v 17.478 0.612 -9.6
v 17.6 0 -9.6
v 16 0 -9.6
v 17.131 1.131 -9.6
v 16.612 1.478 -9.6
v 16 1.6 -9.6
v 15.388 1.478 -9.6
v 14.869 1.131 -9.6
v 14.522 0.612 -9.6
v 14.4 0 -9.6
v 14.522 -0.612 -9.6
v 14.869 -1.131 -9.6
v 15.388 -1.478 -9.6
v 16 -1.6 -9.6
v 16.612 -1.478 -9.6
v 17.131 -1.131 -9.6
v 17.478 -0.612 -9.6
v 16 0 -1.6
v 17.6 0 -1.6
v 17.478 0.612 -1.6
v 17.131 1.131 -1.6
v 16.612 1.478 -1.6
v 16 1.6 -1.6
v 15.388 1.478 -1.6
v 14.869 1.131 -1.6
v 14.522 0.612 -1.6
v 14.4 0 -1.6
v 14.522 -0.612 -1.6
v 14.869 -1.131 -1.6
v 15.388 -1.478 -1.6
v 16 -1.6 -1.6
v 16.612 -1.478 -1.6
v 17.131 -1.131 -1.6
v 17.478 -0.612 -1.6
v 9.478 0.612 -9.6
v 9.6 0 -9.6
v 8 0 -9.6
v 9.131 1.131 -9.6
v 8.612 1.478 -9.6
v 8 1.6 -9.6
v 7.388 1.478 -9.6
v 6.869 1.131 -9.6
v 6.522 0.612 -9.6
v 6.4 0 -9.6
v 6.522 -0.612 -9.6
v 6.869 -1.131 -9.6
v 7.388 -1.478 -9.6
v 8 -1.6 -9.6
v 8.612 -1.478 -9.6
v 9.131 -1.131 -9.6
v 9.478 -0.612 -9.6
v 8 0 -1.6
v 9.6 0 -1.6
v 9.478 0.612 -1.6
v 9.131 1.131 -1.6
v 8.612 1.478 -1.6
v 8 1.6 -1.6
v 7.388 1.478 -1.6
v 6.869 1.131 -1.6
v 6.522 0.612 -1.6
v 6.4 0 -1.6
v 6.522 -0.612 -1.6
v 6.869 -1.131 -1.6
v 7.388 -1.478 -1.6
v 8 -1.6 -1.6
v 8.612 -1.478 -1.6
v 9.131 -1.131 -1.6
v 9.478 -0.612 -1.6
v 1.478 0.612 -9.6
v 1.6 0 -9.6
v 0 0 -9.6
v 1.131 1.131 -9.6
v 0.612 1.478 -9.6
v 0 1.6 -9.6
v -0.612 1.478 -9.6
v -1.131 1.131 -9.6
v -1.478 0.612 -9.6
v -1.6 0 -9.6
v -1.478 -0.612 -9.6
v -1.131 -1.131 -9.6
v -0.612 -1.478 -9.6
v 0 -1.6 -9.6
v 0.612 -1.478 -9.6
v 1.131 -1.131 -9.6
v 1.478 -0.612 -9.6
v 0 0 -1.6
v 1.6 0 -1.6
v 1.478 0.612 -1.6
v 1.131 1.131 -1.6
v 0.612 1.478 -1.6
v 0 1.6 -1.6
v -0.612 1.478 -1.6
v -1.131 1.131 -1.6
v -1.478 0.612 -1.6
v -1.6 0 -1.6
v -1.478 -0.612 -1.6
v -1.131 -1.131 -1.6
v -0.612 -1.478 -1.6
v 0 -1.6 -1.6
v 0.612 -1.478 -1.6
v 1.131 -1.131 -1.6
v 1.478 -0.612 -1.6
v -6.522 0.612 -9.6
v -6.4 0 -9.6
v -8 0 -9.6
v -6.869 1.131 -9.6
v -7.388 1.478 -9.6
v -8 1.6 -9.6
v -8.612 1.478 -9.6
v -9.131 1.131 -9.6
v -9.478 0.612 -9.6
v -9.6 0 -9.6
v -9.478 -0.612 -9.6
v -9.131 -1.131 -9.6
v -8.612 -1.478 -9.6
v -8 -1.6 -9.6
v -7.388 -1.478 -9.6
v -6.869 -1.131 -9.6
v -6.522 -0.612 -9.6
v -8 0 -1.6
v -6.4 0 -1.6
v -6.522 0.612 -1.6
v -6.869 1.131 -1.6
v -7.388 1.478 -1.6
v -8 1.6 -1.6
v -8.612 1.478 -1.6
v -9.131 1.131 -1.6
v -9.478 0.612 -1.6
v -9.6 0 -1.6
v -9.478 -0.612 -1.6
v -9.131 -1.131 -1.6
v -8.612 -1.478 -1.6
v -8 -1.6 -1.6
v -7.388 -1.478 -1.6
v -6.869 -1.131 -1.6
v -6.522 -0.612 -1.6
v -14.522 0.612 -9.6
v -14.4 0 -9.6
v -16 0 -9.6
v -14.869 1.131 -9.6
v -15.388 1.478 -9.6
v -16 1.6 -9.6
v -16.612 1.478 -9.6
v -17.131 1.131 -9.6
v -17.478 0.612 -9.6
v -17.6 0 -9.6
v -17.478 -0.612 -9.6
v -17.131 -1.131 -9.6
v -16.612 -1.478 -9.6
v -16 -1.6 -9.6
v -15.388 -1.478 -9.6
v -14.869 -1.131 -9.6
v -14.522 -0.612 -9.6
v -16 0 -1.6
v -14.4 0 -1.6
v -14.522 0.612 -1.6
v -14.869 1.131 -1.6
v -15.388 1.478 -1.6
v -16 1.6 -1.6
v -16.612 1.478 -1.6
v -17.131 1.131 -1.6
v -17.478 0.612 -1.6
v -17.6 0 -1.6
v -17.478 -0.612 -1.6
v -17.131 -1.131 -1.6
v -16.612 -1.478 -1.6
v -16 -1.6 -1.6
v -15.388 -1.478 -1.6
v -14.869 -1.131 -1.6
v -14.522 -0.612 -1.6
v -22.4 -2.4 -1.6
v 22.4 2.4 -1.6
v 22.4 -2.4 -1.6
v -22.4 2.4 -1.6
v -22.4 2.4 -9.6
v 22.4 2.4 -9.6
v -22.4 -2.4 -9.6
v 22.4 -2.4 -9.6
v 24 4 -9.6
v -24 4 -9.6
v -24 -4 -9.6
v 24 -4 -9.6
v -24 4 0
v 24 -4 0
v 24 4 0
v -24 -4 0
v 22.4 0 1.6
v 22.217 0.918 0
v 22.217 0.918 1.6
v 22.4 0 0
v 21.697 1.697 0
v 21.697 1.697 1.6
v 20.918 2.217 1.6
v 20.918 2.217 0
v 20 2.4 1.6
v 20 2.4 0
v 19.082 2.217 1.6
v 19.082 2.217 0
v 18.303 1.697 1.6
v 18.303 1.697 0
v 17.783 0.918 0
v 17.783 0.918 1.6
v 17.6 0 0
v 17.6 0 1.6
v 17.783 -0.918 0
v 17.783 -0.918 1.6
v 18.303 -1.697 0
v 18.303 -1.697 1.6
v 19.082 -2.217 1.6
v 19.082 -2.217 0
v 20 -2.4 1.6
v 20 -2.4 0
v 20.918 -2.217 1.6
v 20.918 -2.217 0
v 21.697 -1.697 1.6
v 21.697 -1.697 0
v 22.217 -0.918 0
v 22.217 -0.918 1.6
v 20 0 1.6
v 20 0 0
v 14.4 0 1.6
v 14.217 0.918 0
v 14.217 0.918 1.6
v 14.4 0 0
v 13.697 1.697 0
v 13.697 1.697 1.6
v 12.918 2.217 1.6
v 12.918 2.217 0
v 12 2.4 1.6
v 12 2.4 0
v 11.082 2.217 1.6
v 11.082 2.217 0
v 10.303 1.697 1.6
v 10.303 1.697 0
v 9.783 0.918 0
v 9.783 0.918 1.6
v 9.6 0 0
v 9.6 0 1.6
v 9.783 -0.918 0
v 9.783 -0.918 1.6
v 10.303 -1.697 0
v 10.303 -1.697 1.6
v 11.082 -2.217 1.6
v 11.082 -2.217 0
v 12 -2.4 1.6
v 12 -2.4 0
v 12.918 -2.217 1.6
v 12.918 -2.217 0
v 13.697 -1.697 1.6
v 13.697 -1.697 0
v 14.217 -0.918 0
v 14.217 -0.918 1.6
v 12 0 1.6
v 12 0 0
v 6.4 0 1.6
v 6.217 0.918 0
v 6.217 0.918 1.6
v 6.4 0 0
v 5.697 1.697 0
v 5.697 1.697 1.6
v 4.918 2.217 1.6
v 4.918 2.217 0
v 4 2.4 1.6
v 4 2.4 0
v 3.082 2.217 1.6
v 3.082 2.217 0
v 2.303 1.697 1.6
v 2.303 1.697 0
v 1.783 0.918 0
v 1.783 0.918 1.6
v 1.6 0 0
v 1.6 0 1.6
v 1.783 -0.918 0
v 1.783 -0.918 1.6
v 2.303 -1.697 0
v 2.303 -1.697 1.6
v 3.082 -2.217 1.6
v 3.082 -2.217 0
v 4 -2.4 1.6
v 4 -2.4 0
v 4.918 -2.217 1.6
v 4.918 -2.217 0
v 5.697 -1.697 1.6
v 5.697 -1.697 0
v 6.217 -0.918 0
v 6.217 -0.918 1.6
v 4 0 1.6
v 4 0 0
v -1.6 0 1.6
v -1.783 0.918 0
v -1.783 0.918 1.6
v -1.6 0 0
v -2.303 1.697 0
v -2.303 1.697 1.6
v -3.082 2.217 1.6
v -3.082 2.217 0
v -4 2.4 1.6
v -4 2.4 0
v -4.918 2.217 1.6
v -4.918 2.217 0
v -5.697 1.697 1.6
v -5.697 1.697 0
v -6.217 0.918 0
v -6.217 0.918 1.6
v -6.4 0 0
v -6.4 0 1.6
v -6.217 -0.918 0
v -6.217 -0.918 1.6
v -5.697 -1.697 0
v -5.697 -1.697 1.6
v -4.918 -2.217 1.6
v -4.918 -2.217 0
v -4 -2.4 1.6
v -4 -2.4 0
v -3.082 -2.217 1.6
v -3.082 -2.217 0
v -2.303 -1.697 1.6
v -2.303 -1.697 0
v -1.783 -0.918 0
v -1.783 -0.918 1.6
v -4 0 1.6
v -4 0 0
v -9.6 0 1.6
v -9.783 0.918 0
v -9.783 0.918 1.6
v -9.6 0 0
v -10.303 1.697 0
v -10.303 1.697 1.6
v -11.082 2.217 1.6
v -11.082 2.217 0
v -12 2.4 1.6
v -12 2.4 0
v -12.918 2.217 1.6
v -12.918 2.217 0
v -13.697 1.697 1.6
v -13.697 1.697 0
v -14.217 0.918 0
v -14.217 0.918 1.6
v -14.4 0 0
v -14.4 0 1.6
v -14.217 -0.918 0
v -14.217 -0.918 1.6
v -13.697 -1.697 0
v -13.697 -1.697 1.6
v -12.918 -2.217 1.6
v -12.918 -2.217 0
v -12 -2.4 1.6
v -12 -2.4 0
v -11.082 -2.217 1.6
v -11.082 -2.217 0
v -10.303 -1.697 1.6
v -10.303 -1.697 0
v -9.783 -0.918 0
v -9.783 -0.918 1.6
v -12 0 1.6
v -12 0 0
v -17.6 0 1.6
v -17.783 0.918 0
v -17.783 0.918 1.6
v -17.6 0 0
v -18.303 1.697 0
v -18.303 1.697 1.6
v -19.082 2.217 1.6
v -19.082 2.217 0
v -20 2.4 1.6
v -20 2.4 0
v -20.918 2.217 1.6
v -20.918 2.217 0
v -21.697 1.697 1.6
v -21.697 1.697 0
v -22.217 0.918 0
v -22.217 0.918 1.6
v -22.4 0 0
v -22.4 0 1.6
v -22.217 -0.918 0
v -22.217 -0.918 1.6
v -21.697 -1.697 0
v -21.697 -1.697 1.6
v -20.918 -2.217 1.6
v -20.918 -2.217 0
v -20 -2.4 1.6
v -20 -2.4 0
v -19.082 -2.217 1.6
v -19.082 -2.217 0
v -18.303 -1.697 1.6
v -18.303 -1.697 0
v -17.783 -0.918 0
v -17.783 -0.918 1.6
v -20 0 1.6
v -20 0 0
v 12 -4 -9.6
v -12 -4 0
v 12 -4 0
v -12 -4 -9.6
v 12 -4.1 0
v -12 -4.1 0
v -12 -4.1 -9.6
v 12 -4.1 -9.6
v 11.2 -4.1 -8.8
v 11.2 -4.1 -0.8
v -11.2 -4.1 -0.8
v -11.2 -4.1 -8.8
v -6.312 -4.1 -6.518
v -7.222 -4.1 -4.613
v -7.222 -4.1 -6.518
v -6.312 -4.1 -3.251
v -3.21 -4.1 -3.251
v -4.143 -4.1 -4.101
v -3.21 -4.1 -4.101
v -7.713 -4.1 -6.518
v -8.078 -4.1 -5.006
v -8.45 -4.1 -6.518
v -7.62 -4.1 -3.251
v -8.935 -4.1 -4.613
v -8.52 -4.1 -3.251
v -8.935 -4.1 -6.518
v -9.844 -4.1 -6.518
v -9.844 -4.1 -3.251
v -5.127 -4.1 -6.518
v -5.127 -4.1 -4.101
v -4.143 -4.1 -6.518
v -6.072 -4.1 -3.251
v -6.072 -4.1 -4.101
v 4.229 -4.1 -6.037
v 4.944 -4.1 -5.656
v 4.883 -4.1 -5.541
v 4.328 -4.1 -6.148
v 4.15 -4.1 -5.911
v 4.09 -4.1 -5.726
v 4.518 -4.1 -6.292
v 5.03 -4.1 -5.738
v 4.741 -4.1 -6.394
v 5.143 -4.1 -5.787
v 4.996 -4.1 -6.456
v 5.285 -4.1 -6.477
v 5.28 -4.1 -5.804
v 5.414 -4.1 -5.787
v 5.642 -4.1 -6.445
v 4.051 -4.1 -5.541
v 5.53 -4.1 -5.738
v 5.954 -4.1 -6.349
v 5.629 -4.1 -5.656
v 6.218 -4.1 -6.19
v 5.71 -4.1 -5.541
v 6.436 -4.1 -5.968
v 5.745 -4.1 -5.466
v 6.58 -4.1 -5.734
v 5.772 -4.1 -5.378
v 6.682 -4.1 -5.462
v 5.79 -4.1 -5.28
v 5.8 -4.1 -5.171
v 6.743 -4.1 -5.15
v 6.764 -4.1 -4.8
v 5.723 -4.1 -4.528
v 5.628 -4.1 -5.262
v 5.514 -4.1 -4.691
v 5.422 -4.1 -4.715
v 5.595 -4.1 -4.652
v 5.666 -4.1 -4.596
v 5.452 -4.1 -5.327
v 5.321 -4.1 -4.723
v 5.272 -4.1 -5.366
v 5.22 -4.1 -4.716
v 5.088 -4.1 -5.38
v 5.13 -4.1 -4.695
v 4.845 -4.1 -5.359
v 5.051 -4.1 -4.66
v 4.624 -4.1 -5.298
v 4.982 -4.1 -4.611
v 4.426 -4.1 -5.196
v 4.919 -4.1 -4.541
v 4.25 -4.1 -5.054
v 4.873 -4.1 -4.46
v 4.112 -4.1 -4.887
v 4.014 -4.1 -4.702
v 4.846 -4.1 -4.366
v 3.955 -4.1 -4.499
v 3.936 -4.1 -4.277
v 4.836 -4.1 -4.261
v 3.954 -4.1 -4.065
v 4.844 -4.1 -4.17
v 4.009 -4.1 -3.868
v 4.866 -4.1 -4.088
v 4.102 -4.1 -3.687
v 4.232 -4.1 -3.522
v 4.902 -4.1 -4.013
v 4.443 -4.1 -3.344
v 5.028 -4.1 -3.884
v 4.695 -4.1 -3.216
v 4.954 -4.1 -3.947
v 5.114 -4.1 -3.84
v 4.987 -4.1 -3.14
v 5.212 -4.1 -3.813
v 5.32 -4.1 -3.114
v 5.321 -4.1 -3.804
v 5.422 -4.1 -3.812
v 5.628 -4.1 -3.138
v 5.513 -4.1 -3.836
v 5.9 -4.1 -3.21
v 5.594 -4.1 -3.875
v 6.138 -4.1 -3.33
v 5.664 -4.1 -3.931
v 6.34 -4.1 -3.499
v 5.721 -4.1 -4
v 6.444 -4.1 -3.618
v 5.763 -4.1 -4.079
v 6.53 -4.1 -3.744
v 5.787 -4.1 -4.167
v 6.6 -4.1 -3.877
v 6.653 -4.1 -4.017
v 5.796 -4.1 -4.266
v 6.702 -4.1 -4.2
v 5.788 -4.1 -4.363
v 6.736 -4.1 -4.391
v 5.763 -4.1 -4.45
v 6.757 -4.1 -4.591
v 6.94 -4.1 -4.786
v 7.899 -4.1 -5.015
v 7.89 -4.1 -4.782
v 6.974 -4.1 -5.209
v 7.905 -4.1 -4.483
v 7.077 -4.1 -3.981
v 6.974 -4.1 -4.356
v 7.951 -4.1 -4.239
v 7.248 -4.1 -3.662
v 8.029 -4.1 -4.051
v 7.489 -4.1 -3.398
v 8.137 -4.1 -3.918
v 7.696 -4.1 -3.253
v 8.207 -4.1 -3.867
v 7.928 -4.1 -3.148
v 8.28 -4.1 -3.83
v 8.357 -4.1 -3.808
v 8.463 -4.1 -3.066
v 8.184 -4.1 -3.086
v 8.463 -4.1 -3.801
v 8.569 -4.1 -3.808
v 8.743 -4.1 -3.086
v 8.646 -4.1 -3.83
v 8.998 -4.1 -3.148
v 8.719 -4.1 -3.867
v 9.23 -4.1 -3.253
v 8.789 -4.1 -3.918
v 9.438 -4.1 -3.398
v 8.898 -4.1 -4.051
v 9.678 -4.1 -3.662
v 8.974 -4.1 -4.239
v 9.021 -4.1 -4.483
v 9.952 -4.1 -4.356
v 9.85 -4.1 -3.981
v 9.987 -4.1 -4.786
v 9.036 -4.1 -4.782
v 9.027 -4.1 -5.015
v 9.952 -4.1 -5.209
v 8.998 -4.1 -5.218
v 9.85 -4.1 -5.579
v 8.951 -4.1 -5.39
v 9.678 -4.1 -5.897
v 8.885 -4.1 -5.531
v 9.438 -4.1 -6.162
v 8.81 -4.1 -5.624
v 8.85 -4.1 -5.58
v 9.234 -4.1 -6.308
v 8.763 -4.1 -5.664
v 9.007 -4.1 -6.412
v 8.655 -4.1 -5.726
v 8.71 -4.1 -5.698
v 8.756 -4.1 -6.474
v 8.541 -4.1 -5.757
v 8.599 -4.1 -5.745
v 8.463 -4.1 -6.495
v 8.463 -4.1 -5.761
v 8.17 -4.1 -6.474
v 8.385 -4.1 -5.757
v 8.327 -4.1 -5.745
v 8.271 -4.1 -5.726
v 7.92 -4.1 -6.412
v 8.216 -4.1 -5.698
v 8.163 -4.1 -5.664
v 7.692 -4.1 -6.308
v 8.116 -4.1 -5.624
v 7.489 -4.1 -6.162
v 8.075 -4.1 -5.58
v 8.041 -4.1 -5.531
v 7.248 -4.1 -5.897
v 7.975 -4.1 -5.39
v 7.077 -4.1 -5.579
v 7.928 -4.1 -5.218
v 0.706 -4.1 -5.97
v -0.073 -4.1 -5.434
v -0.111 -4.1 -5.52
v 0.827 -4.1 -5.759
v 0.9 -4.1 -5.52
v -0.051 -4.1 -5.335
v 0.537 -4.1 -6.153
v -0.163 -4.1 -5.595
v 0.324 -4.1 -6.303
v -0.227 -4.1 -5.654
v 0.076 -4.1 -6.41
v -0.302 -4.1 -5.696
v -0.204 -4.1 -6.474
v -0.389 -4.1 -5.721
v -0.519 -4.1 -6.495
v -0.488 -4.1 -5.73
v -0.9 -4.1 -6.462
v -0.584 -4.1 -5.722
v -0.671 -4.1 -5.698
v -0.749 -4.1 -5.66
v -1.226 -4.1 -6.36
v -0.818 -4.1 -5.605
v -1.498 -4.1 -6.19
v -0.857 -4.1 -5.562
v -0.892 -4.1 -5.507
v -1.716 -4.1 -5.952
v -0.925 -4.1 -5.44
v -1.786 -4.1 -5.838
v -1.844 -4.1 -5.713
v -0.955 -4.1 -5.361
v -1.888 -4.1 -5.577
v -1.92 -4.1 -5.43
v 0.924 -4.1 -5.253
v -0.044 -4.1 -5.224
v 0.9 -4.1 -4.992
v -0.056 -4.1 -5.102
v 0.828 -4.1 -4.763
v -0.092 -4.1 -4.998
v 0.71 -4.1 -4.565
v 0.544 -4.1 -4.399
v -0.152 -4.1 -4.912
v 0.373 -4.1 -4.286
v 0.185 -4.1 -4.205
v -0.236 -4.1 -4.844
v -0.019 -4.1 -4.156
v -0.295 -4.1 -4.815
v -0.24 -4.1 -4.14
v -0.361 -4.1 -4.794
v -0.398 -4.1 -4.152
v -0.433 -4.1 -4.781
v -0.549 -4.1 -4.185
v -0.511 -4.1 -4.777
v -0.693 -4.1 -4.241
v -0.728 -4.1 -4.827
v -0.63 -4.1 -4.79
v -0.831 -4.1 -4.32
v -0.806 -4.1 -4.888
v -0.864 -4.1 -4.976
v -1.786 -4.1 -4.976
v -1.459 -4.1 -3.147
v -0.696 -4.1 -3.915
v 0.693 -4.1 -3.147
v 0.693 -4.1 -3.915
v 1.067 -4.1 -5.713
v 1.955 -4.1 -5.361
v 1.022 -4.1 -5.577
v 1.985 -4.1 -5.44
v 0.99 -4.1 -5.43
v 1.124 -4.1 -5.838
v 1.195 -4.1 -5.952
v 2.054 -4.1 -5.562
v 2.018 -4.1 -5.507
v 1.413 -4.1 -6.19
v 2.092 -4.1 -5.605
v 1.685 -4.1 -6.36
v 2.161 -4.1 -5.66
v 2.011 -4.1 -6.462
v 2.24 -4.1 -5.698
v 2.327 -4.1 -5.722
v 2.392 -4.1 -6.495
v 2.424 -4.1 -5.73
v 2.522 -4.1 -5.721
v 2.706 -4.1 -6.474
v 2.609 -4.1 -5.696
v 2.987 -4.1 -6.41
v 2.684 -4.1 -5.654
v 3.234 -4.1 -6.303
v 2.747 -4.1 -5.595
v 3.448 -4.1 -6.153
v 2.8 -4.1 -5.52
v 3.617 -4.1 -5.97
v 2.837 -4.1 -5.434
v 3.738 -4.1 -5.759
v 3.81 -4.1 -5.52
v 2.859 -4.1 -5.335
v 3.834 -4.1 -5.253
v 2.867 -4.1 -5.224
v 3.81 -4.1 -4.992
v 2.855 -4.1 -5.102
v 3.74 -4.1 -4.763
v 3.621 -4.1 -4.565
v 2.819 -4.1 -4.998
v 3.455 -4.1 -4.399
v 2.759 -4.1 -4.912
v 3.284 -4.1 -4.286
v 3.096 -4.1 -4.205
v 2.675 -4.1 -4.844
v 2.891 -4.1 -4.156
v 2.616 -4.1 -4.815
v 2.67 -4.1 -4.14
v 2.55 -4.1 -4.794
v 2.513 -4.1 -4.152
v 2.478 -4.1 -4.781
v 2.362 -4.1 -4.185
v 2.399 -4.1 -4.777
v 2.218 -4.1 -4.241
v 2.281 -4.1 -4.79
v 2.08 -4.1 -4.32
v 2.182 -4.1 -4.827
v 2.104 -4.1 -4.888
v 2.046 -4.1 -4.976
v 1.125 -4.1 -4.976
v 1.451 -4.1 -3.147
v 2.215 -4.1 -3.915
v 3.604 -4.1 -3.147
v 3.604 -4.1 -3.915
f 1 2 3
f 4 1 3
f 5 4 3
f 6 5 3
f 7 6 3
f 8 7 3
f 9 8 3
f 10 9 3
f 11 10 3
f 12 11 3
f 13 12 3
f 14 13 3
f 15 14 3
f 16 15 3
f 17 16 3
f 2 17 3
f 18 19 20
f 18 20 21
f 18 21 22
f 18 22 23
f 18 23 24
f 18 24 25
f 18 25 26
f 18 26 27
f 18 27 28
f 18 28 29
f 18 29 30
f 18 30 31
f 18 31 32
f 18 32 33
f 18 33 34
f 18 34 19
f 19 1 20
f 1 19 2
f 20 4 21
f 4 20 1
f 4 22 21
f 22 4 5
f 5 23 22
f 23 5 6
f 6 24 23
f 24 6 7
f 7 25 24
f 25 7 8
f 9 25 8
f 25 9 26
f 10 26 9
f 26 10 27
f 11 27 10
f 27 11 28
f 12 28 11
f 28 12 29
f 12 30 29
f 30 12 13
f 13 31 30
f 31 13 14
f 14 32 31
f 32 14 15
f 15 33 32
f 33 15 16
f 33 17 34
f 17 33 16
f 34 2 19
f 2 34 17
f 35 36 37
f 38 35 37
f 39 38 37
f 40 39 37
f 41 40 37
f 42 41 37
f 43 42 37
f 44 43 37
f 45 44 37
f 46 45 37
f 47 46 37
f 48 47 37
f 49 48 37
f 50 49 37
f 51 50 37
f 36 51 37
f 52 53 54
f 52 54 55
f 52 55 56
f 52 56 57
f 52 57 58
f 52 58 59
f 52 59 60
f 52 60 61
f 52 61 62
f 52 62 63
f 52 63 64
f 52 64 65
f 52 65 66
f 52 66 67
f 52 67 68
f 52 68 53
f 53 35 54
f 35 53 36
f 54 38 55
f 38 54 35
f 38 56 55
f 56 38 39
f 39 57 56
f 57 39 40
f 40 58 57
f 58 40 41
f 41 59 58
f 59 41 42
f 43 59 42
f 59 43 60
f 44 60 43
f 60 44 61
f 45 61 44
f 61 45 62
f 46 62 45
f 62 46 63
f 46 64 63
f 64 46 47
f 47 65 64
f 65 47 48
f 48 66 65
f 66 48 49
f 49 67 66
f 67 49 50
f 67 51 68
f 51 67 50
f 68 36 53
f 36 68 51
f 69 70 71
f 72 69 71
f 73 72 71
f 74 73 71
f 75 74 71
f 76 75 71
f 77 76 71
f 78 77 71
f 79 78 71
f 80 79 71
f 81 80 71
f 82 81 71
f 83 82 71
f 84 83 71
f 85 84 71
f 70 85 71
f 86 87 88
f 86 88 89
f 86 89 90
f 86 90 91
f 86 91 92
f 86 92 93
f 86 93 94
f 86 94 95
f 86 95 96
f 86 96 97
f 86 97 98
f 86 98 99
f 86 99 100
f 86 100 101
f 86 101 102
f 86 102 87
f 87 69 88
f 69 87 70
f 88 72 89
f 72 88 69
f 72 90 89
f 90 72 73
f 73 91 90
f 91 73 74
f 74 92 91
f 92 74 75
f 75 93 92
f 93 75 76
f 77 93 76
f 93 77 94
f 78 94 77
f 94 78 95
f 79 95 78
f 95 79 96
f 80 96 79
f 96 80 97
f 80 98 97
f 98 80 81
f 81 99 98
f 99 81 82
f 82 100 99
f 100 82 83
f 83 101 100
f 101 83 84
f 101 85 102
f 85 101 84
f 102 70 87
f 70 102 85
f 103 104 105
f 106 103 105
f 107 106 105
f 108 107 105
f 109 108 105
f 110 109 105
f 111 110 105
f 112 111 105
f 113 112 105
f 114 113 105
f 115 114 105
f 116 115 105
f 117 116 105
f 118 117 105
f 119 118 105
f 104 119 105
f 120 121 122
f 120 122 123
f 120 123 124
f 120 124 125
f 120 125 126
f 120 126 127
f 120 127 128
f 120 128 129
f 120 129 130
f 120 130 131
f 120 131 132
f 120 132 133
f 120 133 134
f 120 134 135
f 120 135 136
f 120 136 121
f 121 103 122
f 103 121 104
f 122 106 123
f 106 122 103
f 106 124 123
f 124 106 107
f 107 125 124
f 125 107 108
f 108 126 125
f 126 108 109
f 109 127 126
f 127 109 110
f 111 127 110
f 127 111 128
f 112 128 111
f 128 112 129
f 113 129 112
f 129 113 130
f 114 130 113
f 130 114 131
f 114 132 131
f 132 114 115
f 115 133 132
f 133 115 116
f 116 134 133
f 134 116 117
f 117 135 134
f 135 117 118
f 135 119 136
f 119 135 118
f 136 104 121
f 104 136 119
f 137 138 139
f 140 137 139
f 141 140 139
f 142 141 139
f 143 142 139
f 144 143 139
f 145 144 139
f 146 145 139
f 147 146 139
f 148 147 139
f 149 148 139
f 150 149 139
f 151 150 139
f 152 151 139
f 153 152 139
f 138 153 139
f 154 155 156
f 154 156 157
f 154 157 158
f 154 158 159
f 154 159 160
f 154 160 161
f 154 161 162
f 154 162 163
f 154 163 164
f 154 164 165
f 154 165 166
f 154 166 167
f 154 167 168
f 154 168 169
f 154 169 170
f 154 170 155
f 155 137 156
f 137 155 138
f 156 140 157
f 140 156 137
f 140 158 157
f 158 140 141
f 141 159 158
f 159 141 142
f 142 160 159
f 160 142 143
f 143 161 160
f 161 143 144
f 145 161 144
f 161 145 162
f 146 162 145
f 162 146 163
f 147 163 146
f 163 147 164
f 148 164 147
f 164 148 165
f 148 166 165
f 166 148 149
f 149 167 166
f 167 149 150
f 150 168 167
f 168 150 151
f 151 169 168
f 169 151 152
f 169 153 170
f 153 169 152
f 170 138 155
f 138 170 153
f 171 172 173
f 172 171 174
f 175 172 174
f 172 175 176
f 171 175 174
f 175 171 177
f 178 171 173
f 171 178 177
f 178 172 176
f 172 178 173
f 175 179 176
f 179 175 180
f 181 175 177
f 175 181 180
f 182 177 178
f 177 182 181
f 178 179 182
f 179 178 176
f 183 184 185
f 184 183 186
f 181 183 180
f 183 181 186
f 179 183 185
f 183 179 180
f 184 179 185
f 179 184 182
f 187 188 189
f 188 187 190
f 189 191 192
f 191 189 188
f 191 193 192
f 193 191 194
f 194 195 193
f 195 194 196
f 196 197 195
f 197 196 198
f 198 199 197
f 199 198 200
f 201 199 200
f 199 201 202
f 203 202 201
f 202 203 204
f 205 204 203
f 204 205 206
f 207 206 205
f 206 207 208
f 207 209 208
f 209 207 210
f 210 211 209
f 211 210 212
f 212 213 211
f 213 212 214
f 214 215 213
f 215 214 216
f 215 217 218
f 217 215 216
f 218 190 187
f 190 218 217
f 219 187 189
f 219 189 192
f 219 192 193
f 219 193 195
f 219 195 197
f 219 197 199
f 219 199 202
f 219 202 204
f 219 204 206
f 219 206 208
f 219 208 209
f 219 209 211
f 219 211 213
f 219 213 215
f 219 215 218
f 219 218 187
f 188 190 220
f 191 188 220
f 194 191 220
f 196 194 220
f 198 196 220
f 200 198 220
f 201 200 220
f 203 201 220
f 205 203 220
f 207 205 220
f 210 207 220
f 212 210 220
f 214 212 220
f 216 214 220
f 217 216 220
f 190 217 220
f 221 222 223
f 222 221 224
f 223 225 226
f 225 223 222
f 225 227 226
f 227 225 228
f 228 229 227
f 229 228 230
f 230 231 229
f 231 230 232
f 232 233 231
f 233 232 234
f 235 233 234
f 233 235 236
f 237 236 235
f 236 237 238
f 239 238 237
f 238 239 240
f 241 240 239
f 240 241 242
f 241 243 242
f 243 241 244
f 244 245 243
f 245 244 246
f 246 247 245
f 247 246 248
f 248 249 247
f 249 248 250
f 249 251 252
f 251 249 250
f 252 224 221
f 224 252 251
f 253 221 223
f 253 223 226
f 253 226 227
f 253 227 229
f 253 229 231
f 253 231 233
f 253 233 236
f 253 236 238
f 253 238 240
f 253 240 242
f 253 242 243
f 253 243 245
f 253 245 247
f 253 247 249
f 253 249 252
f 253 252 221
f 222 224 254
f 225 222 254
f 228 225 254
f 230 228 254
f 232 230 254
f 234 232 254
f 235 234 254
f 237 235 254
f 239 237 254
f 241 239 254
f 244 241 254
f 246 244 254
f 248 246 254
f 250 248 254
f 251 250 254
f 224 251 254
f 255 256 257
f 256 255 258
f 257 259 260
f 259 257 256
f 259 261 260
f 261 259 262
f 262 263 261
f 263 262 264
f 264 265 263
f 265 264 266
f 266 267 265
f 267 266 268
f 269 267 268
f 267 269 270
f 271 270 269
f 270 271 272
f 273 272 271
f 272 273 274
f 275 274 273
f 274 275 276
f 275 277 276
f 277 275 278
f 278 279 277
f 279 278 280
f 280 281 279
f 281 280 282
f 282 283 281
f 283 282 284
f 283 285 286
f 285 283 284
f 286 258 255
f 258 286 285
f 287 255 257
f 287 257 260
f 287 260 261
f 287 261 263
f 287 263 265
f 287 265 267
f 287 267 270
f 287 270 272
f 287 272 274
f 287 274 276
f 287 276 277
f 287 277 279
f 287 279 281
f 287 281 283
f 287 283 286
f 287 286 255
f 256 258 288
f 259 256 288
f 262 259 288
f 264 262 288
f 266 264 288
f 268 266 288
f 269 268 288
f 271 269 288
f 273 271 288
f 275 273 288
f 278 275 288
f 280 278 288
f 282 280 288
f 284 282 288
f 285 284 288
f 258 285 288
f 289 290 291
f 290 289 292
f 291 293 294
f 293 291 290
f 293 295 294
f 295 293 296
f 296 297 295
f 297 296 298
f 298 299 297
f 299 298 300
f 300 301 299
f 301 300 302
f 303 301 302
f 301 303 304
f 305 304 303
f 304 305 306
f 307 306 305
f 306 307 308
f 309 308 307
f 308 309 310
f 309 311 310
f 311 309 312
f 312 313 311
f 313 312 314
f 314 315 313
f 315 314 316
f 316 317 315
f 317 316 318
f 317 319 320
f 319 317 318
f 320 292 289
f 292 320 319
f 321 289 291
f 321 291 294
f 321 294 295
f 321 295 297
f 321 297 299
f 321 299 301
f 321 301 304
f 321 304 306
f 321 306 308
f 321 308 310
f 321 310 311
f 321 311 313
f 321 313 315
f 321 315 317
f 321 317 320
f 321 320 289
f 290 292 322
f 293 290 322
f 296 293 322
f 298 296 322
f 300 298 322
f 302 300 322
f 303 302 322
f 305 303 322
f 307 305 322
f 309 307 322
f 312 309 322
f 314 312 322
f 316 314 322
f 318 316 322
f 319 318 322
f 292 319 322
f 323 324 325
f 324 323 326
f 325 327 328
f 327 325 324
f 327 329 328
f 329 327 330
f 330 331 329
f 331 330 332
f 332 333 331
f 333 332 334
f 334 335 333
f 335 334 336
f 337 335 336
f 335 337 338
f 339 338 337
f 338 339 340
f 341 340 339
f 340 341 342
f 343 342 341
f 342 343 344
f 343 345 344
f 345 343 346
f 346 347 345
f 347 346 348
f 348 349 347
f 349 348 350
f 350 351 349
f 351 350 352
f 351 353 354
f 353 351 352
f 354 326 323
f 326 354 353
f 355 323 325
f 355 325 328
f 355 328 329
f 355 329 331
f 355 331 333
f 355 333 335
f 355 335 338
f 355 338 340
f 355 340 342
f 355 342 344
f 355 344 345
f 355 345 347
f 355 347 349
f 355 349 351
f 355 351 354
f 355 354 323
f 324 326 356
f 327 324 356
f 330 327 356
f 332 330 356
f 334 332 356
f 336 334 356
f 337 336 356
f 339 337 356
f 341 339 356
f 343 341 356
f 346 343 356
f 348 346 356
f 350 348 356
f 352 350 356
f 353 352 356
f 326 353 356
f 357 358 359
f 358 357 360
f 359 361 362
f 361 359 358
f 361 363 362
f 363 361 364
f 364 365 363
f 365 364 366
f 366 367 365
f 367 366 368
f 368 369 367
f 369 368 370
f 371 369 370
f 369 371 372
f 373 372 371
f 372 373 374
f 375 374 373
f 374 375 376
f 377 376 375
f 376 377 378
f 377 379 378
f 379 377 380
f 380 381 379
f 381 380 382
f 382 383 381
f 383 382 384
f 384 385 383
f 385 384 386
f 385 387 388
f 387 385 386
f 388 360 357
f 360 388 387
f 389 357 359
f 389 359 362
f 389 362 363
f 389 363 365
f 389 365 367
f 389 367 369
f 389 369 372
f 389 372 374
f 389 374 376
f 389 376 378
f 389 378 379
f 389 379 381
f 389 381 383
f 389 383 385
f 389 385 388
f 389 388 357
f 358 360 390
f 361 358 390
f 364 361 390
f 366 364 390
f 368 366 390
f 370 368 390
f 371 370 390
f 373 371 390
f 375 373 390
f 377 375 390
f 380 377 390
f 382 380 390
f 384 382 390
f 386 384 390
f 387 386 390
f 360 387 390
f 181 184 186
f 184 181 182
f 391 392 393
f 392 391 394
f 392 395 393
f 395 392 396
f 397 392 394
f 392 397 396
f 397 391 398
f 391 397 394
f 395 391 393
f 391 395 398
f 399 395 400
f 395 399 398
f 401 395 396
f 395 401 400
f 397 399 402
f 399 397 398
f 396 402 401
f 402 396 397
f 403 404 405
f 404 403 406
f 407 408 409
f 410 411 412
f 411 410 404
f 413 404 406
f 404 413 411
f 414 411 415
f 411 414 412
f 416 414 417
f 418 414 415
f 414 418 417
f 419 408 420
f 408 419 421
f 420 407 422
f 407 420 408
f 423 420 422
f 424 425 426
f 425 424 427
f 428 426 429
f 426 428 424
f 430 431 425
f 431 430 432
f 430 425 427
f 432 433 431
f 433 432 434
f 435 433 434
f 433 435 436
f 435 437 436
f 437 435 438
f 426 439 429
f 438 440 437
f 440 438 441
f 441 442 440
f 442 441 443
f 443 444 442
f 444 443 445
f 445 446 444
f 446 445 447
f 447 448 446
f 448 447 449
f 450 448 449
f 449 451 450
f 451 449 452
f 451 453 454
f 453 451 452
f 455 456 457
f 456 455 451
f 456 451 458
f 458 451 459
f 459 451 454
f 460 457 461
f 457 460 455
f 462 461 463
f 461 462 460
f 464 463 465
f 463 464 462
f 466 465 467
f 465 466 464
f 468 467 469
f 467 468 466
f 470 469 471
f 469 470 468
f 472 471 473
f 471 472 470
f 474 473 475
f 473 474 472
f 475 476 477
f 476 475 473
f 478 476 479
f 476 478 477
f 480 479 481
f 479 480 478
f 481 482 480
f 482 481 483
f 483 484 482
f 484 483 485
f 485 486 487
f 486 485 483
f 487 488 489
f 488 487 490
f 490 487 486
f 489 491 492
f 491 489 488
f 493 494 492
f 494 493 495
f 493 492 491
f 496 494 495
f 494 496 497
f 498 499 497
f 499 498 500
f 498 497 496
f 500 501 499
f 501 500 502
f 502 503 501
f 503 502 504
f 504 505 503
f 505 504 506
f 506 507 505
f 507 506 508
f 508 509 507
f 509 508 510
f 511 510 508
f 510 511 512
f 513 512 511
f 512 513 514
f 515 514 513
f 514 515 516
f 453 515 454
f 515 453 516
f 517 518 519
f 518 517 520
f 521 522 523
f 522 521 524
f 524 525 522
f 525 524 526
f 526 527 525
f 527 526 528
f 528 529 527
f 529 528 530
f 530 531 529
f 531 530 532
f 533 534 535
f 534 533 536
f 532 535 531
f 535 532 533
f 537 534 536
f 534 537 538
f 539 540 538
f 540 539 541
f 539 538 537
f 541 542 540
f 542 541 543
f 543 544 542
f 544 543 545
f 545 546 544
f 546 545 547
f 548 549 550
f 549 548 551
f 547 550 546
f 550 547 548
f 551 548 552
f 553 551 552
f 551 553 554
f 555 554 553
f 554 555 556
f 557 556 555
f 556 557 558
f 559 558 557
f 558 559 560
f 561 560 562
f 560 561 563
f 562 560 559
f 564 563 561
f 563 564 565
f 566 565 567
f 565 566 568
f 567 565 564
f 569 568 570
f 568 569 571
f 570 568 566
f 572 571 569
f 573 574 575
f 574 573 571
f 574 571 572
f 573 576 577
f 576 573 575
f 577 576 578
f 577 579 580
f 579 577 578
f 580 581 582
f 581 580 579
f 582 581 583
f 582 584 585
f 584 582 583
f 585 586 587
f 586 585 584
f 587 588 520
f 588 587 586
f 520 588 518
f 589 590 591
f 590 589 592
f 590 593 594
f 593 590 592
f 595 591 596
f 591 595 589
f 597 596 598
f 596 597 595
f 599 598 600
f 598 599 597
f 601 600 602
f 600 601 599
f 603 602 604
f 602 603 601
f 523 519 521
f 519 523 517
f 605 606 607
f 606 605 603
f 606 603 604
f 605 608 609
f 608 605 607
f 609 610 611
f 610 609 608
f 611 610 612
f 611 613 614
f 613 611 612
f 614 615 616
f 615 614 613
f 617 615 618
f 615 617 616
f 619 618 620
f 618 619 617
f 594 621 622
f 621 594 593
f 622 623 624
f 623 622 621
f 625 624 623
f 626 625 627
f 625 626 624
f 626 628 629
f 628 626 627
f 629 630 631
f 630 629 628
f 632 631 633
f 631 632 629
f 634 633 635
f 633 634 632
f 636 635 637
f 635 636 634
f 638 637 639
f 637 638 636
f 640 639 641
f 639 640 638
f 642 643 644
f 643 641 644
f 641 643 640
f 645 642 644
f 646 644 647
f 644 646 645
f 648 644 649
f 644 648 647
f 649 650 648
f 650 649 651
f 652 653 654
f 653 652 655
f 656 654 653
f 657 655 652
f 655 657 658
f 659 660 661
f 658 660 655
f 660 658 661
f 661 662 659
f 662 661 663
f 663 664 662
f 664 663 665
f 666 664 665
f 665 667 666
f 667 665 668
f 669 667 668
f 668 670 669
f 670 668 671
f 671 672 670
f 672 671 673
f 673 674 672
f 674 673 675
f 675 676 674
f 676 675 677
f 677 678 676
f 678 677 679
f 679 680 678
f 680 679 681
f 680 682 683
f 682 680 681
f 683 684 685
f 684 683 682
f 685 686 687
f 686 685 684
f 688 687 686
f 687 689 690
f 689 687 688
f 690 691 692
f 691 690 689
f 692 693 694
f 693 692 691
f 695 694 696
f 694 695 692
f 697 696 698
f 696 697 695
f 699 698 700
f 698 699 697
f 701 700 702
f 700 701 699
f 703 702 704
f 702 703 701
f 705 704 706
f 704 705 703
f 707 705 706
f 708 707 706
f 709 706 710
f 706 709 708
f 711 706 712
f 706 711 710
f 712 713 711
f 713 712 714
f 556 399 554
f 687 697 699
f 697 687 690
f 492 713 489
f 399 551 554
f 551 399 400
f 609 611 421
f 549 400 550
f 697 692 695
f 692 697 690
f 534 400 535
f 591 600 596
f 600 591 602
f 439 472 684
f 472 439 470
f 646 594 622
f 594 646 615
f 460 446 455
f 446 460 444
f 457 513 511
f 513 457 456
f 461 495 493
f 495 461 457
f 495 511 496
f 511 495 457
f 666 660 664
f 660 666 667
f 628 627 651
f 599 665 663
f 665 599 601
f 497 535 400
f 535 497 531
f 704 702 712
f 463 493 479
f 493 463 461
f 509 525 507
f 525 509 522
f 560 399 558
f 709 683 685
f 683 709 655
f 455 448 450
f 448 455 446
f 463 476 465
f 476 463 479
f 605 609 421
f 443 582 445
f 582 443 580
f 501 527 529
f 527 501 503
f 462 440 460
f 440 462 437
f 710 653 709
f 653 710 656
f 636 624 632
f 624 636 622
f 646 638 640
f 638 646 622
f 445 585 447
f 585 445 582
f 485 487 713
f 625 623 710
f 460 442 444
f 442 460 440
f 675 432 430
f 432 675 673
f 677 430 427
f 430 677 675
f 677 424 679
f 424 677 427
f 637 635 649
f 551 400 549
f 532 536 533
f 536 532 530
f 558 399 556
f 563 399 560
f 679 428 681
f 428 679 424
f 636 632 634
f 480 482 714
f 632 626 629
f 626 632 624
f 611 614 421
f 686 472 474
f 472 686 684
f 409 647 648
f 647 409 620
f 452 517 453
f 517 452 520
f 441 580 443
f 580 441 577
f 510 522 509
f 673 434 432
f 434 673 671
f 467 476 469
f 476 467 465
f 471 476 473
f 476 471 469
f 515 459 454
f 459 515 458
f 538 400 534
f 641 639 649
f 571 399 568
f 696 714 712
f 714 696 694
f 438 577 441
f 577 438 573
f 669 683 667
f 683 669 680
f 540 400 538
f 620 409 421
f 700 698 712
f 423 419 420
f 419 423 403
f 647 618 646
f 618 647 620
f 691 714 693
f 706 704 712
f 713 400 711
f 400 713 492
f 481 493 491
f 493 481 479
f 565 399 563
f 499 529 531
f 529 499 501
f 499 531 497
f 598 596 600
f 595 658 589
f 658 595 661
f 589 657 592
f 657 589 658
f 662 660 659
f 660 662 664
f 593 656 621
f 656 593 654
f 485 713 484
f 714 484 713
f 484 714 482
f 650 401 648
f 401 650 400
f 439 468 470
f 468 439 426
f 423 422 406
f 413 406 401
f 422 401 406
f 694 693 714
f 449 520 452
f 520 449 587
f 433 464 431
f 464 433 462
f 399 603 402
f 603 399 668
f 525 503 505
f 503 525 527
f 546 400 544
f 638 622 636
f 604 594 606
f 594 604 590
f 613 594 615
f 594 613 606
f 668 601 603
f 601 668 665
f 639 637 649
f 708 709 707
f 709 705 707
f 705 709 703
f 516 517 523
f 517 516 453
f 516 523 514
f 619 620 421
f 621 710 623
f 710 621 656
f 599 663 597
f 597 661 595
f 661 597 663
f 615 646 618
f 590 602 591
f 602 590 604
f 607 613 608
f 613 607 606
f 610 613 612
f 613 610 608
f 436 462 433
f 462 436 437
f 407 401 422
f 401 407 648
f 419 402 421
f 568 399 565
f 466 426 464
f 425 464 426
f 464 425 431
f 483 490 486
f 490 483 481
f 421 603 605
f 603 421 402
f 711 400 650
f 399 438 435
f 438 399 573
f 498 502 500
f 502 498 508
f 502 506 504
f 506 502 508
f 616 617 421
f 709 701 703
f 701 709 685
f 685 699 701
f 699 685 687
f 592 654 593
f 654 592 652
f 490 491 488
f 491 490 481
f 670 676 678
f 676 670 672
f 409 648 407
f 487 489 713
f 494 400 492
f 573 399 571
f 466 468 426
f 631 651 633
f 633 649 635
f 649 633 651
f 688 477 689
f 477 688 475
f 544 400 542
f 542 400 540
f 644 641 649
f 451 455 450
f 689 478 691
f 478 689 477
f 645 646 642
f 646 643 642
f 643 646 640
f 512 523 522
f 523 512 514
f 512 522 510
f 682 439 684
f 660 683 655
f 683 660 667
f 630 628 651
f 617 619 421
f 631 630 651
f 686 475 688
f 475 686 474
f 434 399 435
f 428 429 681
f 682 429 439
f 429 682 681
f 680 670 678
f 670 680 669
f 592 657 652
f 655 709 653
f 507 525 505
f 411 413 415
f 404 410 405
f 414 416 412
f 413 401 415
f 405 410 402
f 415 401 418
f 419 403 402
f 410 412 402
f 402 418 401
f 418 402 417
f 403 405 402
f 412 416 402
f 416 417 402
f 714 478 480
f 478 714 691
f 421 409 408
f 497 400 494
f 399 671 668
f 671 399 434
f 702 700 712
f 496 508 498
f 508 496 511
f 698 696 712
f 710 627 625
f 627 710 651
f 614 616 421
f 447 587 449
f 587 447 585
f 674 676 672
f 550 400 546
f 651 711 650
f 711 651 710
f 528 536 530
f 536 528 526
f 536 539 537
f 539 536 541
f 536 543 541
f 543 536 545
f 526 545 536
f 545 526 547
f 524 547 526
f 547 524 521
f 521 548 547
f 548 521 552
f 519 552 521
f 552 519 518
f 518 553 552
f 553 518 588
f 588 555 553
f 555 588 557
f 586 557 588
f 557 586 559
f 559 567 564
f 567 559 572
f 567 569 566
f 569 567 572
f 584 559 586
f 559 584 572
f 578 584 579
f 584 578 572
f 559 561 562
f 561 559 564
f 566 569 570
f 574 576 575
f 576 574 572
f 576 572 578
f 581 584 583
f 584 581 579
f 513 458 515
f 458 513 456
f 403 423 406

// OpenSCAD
use <../lib.scad>
use <193445d.scad>
use <3009.scad>
function ldraw_lib__3009d0m() = [
// 0 Brick  1 x  6 with License Plate "MT 5590" Sticker
// 0 Name: 3009d0m.dat
// 0 Author: Takeshi Takahashi [RainbowDolphin]
// 0 !LDRAW_ORG Shortcut UPDATE 2024-07
// 0 !LICENSE Licensed under CC BY 4.0 : see CAreadme.txt
// 
// 0 BFC CERTIFY CCW
  [0,"BFC","CERTIFY"],
  [0,"BFC","CCW"],
// 
// 0 !CATEGORY Sticker Shortcut
// 0 !KEYWORDS Bricklink 3009pb066, Model Team, Set 5590, truck
// 
// 0 !HISTORY 2024-08-26 [OrionP] Official Update 2024-07
// 
// 1 16 0 0 0 1 0 0 0 1 0 0 0 1 3009.dat
  [1,16,0,0,0,1,0,0,0,1,0,0,0,1, ldraw_lib__3009()],
// 1 16 0 12 -10 1 0 0 0 0 -1 0 1 0 193445d.dat
  [1,16,0,12,-10,1,0,0,0,0,-1,0,1,0, ldraw_lib__193445d()],
];
module ldraw_lib__3009d0m(step=0, col=false, unit=2/5, alt=false, line=0.2, solid=!$preview)
    makepoly(ldraw_lib__3009d0m(), step=step, col=col, unit=unit, alt=alt, line=line, solid=solid);
ldraw_lib__3009d0m(line=0.2);
